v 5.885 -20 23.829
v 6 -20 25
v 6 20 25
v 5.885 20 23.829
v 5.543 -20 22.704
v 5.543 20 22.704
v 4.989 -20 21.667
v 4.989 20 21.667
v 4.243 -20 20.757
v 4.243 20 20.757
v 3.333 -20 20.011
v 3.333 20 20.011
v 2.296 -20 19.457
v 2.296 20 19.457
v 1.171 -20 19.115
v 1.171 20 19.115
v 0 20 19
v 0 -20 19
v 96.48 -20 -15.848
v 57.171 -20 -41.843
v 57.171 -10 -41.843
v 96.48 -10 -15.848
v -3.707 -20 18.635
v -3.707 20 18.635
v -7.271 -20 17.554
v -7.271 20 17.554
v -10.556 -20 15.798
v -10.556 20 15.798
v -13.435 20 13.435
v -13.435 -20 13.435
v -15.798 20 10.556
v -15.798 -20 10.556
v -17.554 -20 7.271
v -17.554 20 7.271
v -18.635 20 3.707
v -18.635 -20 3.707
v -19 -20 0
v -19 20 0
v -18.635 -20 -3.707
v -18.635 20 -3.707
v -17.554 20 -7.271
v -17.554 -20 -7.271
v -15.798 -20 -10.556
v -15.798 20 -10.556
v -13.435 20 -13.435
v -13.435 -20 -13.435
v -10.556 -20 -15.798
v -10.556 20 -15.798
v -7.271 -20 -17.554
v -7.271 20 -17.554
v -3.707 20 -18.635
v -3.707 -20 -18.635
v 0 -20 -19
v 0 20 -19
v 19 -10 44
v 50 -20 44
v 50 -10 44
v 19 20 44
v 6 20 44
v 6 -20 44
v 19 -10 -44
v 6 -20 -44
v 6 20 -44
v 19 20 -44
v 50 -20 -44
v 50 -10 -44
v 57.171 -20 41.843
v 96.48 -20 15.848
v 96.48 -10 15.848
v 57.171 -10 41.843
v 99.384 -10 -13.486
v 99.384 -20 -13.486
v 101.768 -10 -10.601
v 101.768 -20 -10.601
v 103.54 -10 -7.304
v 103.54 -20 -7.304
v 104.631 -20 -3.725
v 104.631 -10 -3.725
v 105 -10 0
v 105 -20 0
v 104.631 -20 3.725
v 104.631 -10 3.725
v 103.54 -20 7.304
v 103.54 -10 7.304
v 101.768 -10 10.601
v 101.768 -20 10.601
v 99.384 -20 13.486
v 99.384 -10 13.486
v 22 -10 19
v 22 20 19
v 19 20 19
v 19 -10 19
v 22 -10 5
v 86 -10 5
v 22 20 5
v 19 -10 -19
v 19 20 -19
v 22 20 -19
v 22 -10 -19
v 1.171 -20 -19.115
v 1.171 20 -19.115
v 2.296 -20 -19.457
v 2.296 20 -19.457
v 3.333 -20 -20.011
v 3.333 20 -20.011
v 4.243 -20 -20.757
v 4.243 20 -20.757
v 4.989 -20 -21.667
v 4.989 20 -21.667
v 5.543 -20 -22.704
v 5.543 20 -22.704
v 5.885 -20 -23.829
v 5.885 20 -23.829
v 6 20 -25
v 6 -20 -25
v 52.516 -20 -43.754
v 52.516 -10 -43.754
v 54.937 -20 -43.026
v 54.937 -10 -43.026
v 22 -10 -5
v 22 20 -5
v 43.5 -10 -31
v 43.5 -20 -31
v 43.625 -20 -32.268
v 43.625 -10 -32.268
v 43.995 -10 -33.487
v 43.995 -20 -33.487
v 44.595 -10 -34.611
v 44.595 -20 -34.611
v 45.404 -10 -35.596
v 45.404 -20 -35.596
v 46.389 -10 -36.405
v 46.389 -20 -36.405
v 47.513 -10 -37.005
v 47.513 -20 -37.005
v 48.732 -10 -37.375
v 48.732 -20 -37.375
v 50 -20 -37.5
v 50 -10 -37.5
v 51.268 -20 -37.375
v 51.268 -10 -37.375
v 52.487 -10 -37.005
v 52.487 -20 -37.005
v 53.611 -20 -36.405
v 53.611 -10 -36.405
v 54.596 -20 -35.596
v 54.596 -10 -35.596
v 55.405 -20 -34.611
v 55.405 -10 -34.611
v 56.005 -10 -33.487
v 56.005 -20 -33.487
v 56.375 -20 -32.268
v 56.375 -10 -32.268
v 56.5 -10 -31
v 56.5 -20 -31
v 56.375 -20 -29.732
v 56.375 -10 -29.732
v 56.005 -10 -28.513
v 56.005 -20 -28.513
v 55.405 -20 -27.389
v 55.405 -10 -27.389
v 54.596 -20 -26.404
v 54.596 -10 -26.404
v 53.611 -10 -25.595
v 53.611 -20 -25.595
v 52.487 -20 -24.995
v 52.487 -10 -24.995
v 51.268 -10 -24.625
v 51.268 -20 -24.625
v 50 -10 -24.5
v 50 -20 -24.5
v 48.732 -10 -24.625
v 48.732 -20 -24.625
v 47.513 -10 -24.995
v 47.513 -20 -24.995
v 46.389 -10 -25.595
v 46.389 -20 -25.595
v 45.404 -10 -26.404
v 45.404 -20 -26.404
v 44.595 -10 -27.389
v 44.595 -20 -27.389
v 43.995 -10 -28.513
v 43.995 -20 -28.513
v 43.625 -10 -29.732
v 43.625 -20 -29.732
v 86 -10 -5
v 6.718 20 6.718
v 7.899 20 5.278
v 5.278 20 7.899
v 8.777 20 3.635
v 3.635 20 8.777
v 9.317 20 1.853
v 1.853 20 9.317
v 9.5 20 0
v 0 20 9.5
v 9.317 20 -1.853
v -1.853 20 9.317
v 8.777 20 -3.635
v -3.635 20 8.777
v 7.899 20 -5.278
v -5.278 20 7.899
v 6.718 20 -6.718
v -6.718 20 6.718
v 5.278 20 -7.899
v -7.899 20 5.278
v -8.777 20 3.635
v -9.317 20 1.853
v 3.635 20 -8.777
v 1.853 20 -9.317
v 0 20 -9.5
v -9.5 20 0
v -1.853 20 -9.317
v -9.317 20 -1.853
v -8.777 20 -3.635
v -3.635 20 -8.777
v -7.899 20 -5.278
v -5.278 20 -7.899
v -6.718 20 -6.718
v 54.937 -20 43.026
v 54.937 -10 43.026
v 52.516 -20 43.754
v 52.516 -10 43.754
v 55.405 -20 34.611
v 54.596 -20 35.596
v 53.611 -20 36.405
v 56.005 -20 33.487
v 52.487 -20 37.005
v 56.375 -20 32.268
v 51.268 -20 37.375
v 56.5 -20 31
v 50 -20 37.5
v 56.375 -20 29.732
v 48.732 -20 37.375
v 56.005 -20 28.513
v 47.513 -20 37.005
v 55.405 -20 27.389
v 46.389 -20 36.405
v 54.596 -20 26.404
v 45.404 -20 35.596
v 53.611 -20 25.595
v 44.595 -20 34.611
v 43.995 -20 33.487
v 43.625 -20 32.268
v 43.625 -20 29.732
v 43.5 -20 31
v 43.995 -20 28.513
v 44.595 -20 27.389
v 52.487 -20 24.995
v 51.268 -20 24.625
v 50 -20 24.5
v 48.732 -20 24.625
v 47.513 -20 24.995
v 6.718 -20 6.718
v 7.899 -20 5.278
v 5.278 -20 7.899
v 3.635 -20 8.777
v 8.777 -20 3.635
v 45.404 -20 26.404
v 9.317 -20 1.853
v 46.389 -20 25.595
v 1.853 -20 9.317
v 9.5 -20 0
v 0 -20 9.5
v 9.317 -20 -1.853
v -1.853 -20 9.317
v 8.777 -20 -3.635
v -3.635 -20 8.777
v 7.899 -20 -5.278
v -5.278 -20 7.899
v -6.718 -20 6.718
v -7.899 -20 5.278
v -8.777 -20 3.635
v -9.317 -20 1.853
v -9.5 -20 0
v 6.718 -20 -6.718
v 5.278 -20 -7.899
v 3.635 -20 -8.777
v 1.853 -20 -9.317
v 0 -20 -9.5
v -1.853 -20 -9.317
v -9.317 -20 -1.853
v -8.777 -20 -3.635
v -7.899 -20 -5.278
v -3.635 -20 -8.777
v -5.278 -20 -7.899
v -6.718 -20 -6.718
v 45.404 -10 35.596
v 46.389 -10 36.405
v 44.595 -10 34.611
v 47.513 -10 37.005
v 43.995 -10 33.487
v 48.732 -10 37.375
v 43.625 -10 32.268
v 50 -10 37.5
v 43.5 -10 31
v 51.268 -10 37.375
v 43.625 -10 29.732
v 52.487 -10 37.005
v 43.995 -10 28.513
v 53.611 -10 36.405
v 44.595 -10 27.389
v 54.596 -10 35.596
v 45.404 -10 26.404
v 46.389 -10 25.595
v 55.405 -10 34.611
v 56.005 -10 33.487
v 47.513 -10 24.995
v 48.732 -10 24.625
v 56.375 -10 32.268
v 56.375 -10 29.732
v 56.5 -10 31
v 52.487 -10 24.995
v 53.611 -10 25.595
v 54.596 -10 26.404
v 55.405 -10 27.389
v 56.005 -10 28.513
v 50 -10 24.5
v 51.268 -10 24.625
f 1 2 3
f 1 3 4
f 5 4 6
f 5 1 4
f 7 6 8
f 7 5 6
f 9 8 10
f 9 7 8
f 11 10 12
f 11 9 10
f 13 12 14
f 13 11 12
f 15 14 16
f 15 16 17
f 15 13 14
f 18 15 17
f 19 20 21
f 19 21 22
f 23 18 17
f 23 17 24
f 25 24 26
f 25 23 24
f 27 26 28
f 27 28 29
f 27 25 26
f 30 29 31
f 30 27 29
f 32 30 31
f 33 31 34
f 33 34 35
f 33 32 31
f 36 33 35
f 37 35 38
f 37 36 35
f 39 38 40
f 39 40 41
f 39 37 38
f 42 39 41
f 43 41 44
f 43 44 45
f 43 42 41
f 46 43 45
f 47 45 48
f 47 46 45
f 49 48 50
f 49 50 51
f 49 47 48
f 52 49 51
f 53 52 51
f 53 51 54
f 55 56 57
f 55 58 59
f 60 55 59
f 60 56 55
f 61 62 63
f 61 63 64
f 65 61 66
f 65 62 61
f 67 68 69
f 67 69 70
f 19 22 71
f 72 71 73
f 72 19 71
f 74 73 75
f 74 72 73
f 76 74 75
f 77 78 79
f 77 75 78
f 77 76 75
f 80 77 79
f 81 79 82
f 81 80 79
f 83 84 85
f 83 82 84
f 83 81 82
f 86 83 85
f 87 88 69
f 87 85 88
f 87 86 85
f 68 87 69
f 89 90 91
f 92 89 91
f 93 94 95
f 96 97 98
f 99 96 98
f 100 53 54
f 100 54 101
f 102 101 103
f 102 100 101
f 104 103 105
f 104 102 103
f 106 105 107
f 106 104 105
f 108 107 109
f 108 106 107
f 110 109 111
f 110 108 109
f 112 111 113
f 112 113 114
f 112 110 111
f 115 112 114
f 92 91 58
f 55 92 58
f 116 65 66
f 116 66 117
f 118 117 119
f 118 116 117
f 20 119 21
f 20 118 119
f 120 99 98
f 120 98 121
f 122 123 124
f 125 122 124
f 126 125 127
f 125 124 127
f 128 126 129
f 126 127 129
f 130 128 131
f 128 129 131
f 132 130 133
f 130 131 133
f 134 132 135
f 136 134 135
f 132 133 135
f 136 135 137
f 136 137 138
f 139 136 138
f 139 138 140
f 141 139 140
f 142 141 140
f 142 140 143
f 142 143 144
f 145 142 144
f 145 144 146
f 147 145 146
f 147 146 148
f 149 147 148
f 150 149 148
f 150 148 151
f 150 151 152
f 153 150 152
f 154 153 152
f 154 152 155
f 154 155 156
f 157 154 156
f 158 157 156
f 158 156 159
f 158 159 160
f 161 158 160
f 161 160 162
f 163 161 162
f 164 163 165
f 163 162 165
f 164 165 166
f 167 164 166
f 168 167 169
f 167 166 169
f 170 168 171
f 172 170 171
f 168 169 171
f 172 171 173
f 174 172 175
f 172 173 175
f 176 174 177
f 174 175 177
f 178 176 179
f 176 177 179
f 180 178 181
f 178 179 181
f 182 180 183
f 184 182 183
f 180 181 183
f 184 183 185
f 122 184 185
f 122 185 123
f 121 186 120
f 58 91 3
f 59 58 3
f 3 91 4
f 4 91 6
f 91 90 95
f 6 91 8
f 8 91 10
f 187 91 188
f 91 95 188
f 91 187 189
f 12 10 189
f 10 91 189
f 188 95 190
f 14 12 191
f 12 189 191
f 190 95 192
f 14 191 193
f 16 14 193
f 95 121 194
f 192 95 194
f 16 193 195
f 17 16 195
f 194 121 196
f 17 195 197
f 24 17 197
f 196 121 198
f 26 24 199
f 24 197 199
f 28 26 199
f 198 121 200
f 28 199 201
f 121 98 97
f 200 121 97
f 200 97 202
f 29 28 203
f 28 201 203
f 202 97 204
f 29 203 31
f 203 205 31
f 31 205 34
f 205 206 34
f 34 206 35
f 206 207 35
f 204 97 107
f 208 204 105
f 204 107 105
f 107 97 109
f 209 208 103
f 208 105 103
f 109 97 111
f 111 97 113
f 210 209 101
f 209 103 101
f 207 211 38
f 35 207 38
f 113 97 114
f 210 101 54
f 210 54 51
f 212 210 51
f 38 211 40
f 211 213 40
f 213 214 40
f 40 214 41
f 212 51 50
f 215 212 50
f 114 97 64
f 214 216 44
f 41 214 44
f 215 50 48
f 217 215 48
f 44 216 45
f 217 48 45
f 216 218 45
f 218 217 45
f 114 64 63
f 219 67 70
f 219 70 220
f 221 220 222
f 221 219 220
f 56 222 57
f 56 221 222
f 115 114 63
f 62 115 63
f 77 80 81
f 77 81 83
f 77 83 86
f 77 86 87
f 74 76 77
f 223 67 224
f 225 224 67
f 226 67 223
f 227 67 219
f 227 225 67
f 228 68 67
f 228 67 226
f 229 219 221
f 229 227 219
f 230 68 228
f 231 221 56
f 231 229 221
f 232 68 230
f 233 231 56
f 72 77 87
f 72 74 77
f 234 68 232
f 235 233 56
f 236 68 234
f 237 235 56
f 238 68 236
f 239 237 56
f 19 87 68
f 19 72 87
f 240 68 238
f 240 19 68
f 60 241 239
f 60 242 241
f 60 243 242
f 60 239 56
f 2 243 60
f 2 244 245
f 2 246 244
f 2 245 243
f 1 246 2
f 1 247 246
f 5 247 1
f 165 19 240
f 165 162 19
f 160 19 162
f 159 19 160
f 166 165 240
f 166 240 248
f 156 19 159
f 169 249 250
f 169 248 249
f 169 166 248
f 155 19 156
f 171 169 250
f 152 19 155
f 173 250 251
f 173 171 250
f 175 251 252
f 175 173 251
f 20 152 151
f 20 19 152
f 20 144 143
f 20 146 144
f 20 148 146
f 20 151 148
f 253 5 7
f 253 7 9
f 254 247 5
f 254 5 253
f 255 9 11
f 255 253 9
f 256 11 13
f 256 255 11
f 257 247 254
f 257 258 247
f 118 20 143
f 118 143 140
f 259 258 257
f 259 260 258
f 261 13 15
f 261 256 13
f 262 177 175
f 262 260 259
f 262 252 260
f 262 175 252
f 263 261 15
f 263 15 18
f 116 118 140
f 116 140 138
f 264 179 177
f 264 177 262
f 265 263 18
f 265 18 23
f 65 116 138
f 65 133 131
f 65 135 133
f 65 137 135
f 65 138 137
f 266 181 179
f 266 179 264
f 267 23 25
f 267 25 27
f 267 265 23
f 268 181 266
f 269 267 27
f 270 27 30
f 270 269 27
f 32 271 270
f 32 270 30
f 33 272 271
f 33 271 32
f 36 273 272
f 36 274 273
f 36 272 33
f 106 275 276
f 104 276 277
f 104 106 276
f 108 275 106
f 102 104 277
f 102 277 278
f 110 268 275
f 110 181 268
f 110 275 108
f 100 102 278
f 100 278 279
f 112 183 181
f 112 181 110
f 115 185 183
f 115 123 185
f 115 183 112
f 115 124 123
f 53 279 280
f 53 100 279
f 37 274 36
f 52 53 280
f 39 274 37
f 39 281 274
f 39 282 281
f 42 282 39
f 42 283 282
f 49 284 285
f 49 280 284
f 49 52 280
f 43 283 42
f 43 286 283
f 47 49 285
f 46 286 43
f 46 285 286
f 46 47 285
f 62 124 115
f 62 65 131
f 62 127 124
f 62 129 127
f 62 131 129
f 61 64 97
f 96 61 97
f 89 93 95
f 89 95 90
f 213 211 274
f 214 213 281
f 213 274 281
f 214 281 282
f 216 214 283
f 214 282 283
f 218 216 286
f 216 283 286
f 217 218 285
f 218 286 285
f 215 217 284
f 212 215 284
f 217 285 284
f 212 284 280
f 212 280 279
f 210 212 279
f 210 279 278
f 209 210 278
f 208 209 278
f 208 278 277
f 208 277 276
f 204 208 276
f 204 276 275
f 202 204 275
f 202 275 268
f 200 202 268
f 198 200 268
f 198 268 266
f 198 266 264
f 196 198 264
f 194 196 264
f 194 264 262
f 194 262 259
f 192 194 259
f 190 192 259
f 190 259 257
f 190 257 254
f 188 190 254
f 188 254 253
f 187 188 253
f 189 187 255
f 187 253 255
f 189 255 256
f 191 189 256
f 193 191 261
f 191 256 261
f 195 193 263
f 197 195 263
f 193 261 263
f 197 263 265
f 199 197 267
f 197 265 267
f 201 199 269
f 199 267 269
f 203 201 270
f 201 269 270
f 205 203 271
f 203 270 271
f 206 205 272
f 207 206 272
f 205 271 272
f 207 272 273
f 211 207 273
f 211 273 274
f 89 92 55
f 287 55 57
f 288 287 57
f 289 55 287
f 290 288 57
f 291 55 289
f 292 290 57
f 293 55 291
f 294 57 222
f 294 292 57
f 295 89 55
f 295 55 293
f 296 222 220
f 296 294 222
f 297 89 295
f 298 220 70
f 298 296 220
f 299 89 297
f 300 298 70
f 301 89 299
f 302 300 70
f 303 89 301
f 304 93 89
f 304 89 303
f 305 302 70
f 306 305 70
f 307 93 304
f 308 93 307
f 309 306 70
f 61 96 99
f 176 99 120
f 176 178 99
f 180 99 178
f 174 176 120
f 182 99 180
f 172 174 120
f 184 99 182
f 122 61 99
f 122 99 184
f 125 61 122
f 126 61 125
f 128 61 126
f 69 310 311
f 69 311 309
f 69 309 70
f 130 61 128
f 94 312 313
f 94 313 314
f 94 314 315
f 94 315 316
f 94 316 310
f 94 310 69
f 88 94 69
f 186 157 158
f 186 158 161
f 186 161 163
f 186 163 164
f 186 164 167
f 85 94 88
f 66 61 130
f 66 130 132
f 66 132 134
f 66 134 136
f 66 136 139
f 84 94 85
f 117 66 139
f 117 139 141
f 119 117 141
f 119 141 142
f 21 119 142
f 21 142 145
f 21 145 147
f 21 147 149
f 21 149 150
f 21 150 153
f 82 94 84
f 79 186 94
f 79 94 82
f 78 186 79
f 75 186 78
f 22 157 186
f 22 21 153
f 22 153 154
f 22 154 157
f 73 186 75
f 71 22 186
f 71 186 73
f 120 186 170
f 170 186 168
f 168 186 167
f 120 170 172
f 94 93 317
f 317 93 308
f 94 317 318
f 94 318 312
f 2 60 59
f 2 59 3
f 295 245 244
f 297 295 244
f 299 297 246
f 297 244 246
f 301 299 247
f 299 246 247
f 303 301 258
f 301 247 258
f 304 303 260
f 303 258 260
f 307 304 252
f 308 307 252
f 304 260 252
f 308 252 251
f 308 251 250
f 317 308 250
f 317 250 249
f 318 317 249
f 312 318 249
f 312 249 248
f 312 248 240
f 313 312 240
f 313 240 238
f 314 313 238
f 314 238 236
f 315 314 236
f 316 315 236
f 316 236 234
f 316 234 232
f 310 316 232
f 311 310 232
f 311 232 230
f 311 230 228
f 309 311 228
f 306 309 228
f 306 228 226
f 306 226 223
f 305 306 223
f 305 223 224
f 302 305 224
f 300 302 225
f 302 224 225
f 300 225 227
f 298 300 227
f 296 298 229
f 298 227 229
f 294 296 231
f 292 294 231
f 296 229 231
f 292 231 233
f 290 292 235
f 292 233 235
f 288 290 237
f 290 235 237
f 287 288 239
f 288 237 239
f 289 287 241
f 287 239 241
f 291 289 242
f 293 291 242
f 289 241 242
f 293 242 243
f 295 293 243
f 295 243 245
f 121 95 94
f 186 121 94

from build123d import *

# Parameters (mm, degrees)
BOSS_EXTRUDE1_DEPTH      = 20
BOSS_EXTRUDE1_DEPTH_BACK = 20
CUT_EXTRUDE1_START       = -30
CUT_EXTRUDE1_DEPTH       = 30
BOSS_EXTRUDE2_START      = -44
BOSS_EXTRUDE2_DEPTH      = 5
HOLE1_D                  = 19
HOLE2_D                  = 13


with BuildPart() as part:
    # Sketch1 → Boss-Extrude1 (new, two sides: drawn at the far end of the back side and taken through both)
    with BuildSketch(Plane(origin=(0, 0, 0), x_dir=(1, 0, 0), z_dir=(0, 1, 0)).offset(-BOSS_EXTRUDE1_DEPTH_BACK)):
        with BuildLine():
            Line((6, 25), (6, 44))
            Line((6, 44), (50, 44))
            ThreePointArc((50, 44), (53.744006319, 43.449193415), (57.170747509, 41.843448721))
            Line((57.170747509, 41.843448721), (96.480323283, 15.848117361))
            ThreePointArc((96.480323283, 15.848117361), (105, 0), (96.480323283, -15.848117361))
            Line((96.480323283, -15.848117361), (57.170747509, -41.843448721))
            ThreePointArc((57.170747509, -41.843448721), (53.744006319, -43.449193415), (50, -44))
            Line((50, -44), (6, -44))
            Line((6, -44), (6, -25))
            ThreePointArc((6, -25), (4.242640687, -20.757359313), (0, -19))
            ThreePointArc((0, -19), (-19, 0), (0, 19))
            ThreePointArc((0, 19), (4.242640687, 20.757359313), (6, 25))
        make_face()
    extrude(amount=BOSS_EXTRUDE1_DEPTH + BOSS_EXTRUDE1_DEPTH_BACK)

    # Sketch2 → Cut-Extrude1 (cut)
    with BuildSketch(Plane(origin=(0, 20, 0), x_dir=(1, 0, 0), z_dir=(0, 1, 0)).offset(CUT_EXTRUDE1_START)):
        with BuildLine():
            Line((19, 44), (19, 19))
            Line((19, 19), (22, 19))
            Line((22, 19), (22, -19))
            Line((22, -19), (19, -19))
            Line((19, -19), (19, -44))
            Line((19, -44), (50, -44))
            ThreePointArc((50, -44), (53.744006319, -43.449193415), (57.170747509, -41.843448721))
            Line((57.170747509, -41.843448721), (96.480323283, -15.848117361))
            ThreePointArc((96.480323283, -15.848117361), (105, 0), (96.480323283, 15.848117361))
            Line((96.480323283, 15.848117361), (57.170747509, 41.843448721))
            ThreePointArc((57.170747509, 41.843448721), (53.744006319, 43.449193415), (50, 44))
            Line((50, 44), (19, 44))
        make_face()
    extrude(amount=CUT_EXTRUDE1_DEPTH, mode=Mode.SUBTRACT)

    # Sketch3 → Boss-Extrude2 (add, symmetric)
    with BuildSketch(Plane.XY.offset(44).offset(BOSS_EXTRUDE2_START)):
        Polygon((22, 20), (86, -10), (57.170747509, -10), (50, -10), (22, -10), align=None)
    extrude(amount=BOSS_EXTRUDE2_DEPTH, both=True)

    # Hole1 (through all)
    with Locations(Plane(origin=(0, 20, 0), x_dir=(1, 0, 0), z_dir=(0, 1, 0))):
        with Locations((0, 0)):
            Hole(HOLE1_D / 2)

    # Hole2 (through all)
    with Locations(Plane(origin=(0, -10, 0), x_dir=(1, 0, 0), z_dir=(0, 1, 0))):
        with Locations((50, -31), (50, 31)):
            Hole(HOLE2_D / 2)


solid = part.part
